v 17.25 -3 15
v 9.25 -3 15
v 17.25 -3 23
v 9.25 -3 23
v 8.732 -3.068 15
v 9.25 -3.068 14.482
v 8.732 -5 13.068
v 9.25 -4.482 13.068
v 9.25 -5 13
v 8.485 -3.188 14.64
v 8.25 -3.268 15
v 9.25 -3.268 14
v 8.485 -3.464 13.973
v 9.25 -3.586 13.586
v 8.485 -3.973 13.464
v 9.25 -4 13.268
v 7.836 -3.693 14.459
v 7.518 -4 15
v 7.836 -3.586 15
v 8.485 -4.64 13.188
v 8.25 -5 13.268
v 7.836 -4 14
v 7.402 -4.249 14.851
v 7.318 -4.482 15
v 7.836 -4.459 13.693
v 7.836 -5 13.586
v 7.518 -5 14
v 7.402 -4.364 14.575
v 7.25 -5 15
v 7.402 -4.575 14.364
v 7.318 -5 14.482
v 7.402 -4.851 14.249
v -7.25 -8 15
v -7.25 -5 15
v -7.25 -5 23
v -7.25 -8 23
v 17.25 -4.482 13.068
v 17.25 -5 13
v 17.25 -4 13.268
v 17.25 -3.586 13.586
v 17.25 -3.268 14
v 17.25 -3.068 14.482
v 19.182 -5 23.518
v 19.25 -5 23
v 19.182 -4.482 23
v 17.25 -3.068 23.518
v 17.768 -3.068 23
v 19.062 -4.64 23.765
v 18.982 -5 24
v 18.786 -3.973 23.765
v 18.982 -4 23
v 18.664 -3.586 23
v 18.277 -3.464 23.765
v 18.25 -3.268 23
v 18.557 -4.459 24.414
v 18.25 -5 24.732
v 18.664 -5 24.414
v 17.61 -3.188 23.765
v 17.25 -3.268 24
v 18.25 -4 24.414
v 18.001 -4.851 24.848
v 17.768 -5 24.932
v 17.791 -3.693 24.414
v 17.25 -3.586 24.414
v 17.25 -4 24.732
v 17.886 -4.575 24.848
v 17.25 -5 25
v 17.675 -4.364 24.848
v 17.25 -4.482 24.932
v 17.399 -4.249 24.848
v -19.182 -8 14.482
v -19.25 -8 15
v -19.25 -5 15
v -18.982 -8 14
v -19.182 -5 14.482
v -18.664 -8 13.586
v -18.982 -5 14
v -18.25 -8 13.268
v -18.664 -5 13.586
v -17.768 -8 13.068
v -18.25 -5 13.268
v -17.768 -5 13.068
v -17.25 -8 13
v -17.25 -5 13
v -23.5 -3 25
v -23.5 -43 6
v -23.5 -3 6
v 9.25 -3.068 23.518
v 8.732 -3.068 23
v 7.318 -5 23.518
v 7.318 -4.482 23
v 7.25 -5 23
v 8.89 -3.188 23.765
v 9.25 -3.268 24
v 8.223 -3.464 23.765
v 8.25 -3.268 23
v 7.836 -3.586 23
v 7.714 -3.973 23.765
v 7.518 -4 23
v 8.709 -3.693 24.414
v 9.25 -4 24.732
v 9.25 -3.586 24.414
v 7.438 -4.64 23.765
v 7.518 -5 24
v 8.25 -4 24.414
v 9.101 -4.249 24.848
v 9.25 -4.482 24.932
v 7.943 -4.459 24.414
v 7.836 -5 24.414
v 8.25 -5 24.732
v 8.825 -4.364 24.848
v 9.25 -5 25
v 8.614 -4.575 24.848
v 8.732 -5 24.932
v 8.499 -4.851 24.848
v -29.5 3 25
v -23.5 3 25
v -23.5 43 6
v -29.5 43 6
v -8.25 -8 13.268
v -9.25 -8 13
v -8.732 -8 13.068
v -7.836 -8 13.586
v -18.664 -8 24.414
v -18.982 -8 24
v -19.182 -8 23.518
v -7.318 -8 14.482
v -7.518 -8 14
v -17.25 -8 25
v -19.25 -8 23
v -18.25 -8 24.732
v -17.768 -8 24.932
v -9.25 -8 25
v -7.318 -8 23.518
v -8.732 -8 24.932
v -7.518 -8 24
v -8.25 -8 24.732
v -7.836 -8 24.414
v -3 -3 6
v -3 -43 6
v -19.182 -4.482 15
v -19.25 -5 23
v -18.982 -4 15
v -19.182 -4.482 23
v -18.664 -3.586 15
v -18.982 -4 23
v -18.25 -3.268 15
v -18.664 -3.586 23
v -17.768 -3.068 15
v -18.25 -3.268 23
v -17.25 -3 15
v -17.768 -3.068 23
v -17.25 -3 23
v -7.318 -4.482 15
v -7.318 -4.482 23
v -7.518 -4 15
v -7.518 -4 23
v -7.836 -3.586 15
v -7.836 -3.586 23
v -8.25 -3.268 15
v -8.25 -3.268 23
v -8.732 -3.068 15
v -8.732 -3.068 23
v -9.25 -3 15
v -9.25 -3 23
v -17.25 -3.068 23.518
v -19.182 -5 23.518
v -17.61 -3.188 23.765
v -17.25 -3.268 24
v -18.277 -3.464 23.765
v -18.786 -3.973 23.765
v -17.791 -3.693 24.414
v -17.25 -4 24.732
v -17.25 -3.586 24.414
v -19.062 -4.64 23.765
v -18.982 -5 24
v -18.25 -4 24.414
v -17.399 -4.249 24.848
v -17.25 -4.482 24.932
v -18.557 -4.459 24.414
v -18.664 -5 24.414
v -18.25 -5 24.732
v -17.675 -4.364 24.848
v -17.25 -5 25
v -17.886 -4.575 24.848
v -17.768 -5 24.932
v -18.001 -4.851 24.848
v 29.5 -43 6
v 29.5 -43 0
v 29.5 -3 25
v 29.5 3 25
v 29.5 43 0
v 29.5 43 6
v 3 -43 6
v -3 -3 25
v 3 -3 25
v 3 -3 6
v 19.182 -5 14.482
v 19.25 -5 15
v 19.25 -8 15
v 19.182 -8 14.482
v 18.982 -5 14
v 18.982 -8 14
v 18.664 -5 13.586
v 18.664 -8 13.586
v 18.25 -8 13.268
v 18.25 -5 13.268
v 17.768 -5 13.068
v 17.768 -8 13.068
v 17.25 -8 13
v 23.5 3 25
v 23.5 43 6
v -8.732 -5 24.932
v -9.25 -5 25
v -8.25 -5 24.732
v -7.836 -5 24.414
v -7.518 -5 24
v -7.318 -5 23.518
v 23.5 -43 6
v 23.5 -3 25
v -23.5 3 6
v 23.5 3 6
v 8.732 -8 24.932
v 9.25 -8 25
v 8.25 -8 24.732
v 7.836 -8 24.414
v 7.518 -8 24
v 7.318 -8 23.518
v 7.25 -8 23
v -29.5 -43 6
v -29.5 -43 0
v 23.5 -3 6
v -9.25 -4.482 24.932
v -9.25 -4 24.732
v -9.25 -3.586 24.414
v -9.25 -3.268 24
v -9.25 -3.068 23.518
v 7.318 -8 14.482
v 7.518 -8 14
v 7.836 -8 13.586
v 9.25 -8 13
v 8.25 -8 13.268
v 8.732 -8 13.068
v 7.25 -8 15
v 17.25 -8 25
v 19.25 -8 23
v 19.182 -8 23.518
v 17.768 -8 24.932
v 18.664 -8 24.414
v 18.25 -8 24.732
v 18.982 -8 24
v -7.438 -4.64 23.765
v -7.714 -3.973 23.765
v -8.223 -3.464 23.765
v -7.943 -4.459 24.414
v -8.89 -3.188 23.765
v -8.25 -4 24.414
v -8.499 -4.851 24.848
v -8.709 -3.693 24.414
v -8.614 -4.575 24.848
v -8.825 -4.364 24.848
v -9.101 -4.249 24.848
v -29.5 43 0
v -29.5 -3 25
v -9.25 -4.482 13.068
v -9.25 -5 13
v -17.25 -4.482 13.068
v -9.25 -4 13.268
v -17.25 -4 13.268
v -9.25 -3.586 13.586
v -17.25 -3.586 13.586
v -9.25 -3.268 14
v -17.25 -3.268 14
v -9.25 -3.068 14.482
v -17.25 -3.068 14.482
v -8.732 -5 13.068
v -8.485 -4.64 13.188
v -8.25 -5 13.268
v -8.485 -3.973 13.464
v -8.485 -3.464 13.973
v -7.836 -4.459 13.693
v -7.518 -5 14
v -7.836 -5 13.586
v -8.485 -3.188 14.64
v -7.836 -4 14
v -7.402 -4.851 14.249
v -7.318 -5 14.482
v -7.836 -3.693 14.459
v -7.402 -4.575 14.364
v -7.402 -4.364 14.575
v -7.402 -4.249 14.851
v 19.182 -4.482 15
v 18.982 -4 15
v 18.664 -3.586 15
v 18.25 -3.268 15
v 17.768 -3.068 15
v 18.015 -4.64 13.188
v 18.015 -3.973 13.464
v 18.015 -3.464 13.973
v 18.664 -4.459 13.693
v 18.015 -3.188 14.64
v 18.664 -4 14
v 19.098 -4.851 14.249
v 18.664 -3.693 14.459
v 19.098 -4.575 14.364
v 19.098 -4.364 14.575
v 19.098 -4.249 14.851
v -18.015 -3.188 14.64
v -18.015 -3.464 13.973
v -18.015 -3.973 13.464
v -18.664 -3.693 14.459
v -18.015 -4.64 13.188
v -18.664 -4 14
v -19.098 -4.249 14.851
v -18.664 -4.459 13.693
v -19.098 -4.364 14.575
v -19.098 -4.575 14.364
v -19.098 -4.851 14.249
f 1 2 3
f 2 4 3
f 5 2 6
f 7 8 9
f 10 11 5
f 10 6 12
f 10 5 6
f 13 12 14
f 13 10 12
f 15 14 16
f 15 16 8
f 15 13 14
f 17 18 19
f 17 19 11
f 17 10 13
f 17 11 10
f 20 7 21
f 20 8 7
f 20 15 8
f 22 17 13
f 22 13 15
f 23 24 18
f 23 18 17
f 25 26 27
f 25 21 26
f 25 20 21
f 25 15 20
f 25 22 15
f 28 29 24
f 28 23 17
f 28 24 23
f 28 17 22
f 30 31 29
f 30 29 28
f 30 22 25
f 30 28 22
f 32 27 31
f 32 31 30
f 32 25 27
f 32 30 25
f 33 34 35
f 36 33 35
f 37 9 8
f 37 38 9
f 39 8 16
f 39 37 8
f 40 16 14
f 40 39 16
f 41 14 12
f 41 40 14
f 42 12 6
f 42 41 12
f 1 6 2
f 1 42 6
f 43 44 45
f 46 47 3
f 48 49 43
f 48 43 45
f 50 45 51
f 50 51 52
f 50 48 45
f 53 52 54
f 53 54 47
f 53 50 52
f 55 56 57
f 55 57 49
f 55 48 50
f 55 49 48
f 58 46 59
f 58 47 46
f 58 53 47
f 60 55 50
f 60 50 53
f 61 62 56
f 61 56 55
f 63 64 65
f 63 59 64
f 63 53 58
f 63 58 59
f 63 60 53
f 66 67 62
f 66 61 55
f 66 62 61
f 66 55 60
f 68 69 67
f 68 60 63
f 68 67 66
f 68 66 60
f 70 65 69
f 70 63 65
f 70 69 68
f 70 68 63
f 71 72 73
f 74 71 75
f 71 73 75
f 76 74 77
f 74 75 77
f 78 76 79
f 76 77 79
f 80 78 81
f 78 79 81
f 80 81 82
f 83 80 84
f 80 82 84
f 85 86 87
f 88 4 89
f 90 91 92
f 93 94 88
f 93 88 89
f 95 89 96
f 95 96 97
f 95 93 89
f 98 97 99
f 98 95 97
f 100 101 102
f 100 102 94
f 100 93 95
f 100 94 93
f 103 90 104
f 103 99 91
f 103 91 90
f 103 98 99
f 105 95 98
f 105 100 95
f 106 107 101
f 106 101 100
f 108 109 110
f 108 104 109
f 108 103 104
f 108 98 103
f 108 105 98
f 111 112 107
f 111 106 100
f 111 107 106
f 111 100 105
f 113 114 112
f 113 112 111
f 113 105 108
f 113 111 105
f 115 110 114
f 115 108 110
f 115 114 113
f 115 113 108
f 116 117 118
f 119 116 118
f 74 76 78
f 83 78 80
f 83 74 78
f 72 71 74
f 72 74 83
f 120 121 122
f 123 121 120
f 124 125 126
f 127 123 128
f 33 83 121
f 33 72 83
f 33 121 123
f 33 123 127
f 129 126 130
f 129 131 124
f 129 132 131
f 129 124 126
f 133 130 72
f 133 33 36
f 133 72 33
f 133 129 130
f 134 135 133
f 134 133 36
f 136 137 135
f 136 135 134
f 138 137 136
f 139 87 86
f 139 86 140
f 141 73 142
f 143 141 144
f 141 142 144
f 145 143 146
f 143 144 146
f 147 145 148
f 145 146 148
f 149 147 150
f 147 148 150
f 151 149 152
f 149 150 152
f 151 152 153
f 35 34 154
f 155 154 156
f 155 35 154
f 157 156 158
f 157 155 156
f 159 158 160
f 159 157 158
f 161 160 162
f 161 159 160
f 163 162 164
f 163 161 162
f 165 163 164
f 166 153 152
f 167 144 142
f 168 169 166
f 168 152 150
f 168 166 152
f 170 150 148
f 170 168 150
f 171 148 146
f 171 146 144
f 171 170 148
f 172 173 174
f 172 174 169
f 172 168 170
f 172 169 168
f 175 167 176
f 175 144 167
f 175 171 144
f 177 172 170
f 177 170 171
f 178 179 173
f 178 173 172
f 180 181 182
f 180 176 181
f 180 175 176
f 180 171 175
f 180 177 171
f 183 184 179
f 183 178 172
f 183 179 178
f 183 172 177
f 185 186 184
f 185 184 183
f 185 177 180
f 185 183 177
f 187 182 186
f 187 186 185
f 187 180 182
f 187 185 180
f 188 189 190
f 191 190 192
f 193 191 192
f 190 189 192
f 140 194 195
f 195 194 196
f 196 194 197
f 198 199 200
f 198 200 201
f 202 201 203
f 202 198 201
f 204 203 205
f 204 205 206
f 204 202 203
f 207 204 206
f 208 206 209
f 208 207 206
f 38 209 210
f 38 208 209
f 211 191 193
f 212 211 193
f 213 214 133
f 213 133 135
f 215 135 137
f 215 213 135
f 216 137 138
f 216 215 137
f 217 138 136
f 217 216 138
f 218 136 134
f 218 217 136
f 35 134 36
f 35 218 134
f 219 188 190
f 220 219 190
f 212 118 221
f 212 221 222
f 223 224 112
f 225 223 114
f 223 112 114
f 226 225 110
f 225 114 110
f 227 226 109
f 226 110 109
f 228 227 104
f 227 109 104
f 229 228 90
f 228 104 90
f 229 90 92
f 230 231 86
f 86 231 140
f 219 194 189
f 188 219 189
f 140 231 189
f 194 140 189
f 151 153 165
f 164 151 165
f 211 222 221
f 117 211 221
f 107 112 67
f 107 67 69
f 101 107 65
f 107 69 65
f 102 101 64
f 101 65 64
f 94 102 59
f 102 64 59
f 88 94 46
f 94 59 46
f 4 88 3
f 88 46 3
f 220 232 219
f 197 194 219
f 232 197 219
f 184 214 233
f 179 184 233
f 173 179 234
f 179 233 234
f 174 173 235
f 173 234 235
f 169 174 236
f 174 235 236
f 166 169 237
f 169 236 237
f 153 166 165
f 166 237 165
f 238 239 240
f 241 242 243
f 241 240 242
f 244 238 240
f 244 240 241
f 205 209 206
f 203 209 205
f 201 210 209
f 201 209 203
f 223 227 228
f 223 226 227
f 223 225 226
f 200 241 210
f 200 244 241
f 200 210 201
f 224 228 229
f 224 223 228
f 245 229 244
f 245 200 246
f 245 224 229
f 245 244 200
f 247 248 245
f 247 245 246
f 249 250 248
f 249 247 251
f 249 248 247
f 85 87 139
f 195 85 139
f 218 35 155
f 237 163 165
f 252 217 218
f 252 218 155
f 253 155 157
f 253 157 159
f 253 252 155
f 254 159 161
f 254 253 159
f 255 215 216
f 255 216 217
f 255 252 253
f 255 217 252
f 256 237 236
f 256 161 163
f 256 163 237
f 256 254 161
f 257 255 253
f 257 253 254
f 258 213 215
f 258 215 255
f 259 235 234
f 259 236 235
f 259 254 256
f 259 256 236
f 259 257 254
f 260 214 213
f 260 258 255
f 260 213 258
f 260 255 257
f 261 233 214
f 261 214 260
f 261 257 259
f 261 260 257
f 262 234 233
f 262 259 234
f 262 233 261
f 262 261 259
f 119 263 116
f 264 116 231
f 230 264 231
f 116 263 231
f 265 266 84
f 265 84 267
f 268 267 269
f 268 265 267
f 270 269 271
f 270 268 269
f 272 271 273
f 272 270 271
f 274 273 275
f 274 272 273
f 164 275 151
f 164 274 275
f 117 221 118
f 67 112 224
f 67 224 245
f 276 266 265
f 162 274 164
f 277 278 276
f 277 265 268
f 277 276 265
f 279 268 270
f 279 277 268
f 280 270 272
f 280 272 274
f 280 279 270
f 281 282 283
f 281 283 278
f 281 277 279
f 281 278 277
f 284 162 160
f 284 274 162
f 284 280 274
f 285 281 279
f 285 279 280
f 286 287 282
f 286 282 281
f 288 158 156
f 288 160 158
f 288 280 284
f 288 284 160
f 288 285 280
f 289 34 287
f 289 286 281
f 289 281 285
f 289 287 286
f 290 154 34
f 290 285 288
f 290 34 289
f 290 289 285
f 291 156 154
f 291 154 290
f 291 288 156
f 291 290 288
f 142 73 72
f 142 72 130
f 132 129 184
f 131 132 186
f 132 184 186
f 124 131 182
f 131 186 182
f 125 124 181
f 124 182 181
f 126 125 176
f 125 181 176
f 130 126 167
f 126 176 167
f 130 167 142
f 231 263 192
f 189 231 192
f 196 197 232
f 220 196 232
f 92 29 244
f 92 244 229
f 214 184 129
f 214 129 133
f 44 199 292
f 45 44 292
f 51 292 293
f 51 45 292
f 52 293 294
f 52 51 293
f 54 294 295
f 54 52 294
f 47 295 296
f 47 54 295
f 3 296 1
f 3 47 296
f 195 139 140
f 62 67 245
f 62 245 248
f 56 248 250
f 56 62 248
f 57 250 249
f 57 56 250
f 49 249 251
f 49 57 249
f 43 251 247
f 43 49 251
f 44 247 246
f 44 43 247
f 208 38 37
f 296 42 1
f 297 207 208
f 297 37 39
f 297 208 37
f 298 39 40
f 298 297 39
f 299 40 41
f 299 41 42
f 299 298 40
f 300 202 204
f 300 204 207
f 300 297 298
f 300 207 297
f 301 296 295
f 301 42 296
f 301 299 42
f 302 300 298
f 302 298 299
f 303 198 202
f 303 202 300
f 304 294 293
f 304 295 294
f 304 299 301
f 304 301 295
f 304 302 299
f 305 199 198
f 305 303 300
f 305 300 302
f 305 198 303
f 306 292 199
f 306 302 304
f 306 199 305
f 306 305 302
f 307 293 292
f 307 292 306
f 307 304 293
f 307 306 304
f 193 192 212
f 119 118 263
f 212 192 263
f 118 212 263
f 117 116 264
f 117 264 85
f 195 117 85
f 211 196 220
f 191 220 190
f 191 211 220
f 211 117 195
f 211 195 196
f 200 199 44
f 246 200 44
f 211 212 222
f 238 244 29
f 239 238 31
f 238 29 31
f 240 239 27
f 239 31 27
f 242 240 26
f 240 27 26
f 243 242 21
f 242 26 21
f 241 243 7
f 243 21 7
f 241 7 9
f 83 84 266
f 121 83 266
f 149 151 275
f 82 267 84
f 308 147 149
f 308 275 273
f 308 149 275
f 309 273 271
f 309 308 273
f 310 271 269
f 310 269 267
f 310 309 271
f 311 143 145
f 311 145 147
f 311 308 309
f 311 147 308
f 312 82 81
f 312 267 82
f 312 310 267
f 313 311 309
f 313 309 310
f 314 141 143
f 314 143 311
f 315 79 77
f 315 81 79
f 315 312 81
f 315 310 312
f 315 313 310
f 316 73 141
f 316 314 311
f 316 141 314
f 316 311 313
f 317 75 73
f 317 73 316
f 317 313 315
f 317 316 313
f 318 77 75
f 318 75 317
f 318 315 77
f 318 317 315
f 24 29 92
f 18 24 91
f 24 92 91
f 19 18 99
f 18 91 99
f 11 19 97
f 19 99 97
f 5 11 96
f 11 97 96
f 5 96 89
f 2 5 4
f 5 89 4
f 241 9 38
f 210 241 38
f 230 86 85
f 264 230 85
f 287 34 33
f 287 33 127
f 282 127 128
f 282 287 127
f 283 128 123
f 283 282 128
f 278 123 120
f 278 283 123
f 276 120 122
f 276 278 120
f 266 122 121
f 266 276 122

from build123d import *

# Parameters (mm, degrees)
F0_W            = 59
F0_H            = 86
F1_DEPTH        = 6
F3_DEPTH        = 19
F5_DEPTH        = 59.001
F6_W            = 12
F6_H            = 12
F7_DEPTH        = 5
F8_R            = 2
F9_T1_DEPTH     = 8
F9_S5_W         = 2
F9_S5_H         = 2
F9_T6_DEPTH     = 2
F9_S11_W        = 2
F9_S11_H        = 2
F9_T12_DEPTH    = 2
F9_S17_W        = 2
F9_S17_H        = 2
F9_T18_DEPTH    = 2
F9_S23_W        = 2
F9_S23_H        = 2
F9_T24_DEPTH    = 2
F9_S1_T1_DEPTH  = 8
F9_S1_S5_W      = 2
F9_S1_S5_H      = 2
F9_S1_T6_DEPTH  = 2
F9_S1_S11_W     = 2
F9_S1_S11_H     = 2
F9_S1_T12_DEPTH = 2
F9_S1_S17_W     = 2
F9_S1_S17_H     = 2
F9_S1_T18_DEPTH = 2
F9_S1_S23_W     = 2
F9_S1_S23_H     = 2
F9_S1_T24_DEPTH = 2


# Not quite as in the source:
# - a fillet or chamfer that OpenCascade refuses, or shapes differently, is made with other operations: its cross-section is extruded or revolved along the edge and cut away or added


with BuildPart() as f1:
    # F0 (on Top) → F1 (new body)
    with BuildSketch(Plane.XY):
        Rectangle(F0_W, F0_H)
    extrude(amount=F1_DEPTH)

    # F2 (on face) → F3 (join)
    with BuildSketch(Plane.XY.offset(6)):
        Polygon((-23.5, 43), (-29.5, 43), (-29.5, -43), (-23.5, -43), (-23.5, -3), (-3, -3), (-3, -43), (3, -43), (3, -3), (23.5, -3), (23.5, -43), (29.5, -43), (29.5, 43), (23.5, 43), (23.5, 3), (-23.5, 3), align=None)
    extrude(amount=F3_DEPTH)

    # F4 (on face) → F5 (cut, through all)
    with BuildSketch(Plane.YZ.offset(29.5)):
        Polygon((-43, 25), (-43, 6), (-3, 25), align=None)
        Polygon((43, 25), (3, 25), (43, 6), align=None)
    extrude(amount=-F5_DEPTH, mode=Mode.SUBTRACT)


with BuildPart() as f7:
    # F6 (on face) → F7 (new body)
    with BuildSketch(Plane.XZ.offset(3)):
        with Locations((-13.25, 19)):
            Rectangle(F6_W, F6_H)
        with Locations((13.25, 19)):
            Rectangle(F6_W, F6_H)
    extrude(amount=F7_DEPTH)

    # F8
    f8_edges = [f7.edges().sort_by_distance(p)[0] for p in [
        (-7.25, -3, 19),
        (-13.25, -3, 25),
        (-19.25, -3, 19),
        (-13.25, -3, 13),
        (13.25, -3, 13),
        (7.25, -3, 19),
        (19.25, -3, 19),
        (13.25, -3, 25),
    ]]
    fillet(f8_edges, radius=F8_R)

    # F9: fillet of radius 2 on 4 edges, made by hand

    # F9_s2 → F9_t1 (cut)
    with BuildSketch(Plane.XZ.offset(5)):
        with BuildLine():
            ThreePointArc((-7.25, 15), (-7.8357864376, 13.5857864376), (-9.25, 13))
            Line((-9.25, 13), (-7.25, 13))
            Line((-7.25, 13), (-7.25, 15))
        make_face()
        with BuildLine():
            ThreePointArc((-19.25, 15), (-18.6642135624, 13.5857864376), (-17.25, 13))
            Line((-17.25, 13), (-19.25, 13))
            Line((-19.25, 13), (-19.25, 15))
        make_face()
        with BuildLine():
            ThreePointArc((-9.25, 25), (-7.8357864376, 24.4142135624), (-7.25, 23))
            Line((-7.25, 23), (-7.25, 25))
            Line((-7.25, 25), (-9.25, 25))
        make_face()
        with BuildLine():
            ThreePointArc((-17.25, 25), (-18.6642135624, 24.4142135624), (-19.25, 23))
            Line((-19.25, 23), (-19.25, 25))
            Line((-19.25, 25), (-17.25, 25))
        make_face()
    extrude(amount=F9_T1_DEPTH, mode=Mode.SUBTRACT)


with BuildPart() as f9_tool4:
    # F9_s5 → F9_t6 (new body)
    with BuildSketch(Plane.XY.offset(23)):
        with Locations((-18.25, -4)):
            Rectangle(F9_S5_W, F9_S5_H)
    extrude(amount=F9_T6_DEPTH)

    # F9_s7 → F9_t8 (revolve, cut)
    with BuildSketch(Plane(origin=(-17.25, -5, 23), x_dir=(0.7071067812, -0.7071067812, 0), z_dir=(-0.7071067812, -0.7071067812, 0))):
        with BuildLine():
            ThreePointArc((0, -2), (2, 0), (0, 2))
            Line((0, 2), (0, -2))
        make_face()
    revolve(axis=Axis((-17.25, -5, 23), (0, 0, 1)), mode=Mode.SUBTRACT)


with BuildPart() as f7_1:
    add(f7.part)

    # F9_t3: cut F9_tool4
    add(f9_tool4.part, mode=Mode.SUBTRACT)


with BuildPart() as f9_tool10:
    # F9_s11 → F9_t12 (new body)
    with BuildSketch(Plane.XY.offset(23)):
        with Locations((-8.25, -4)):
            Rectangle(F9_S11_W, F9_S11_H)
    extrude(amount=F9_T12_DEPTH)

    # F9_s13 → F9_t14 (revolve, cut)
    with BuildSketch(Plane(origin=(-9.25, -5, 23), x_dir=(-0.7071067812, -0.7071067812, 0), z_dir=(-0.7071067812, 0.7071067812, 0))):
        with BuildLine():
            ThreePointArc((0, -2), (2, 0), (0, 2))
            Line((0, 2), (0, -2))
        make_face()
    revolve(axis=Axis((-9.25, -5, 23), (0, 0, 1)), mode=Mode.SUBTRACT)


with BuildPart() as f7_2:
    add(f7_1.part)

    # F9_t9: cut F9_tool10
    add(f9_tool10.part, mode=Mode.SUBTRACT)


with BuildPart() as f9_tool16:
    # F9_s17 → F9_t18 (new body)
    with BuildSketch(Plane.YZ.offset(-17.25)):
        with Locations((-4, 14)):
            Rectangle(F9_S17_W, F9_S17_H)
    extrude(amount=-F9_T18_DEPTH)

    # F9_s19 → F9_t20 (revolve, cut)
    with BuildSketch(Plane(origin=(-17.25, -5, 15), x_dir=(0, -0.7071067812, 0.7071067812), z_dir=(0, -0.7071067812, -0.7071067812))):
        with BuildLine():
            ThreePointArc((0, -2), (2, 0), (0, 2))
            Line((0, 2), (0, -2))
        make_face()
    revolve(axis=Axis((-17.25, -5, 15), (-1, 0, 0)), mode=Mode.SUBTRACT)


with BuildPart() as f7_3:
    add(f7_2.part)

    # F9_t15: cut F9_tool16
    add(f9_tool16.part, mode=Mode.SUBTRACT)


with BuildPart() as f9_tool22:
    # F9_s23 → F9_t24 (new body)
    with BuildSketch(Plane.YZ.offset(-9.25)):
        with Locations((-4, 14)):
            Rectangle(F9_S23_W, F9_S23_H)
    extrude(amount=F9_T24_DEPTH)

    # F9_s25 → F9_t26 (revolve, cut)
    with BuildSketch(Plane(origin=(-9.25, -5, 15), x_dir=(0, -0.7071067812, 0.7071067812), z_dir=(0, 0.7071067812, 0.7071067812))):
        with BuildLine():
            ThreePointArc((0, -2), (2, 0), (0, 2))
            Line((0, 2), (0, -2))
        make_face()
    revolve(axis=Axis((-9.25, -5, 15), (1, 0, 0)), mode=Mode.SUBTRACT)


with BuildPart() as f7_4:
    add(f7_3.part)

    # F9_t21: cut F9_tool22
    add(f9_tool22.part, mode=Mode.SUBTRACT)

    # F9#s1: fillet of radius 2 on 4 edges, made by hand

    # F9_s1_s2 → F9_s1_t1 (cut)
    with BuildSketch(Plane.XZ.offset(5)):
        with BuildLine():
            ThreePointArc((19.25, 15), (18.6642135624, 13.5857864376), (17.25, 13))
            Line((17.25, 13), (19.25, 13))
            Line((19.25, 13), (19.25, 15))
        make_face()
        with BuildLine():
            ThreePointArc((17.25, 25), (18.6642135624, 24.4142135624), (19.25, 23))
            Line((19.25, 23), (19.25, 25))
            Line((19.25, 25), (17.25, 25))
        make_face()
        with BuildLine():
            ThreePointArc((7.25, 15), (7.8357864376, 13.5857864376), (9.25, 13))
            Line((9.25, 13), (7.25, 13))
            Line((7.25, 13), (7.25, 15))
        make_face()
        with BuildLine():
            ThreePointArc((9.25, 25), (7.8357864376, 24.4142135624), (7.25, 23))
            Line((7.25, 23), (7.25, 25))
            Line((7.25, 25), (9.25, 25))
        make_face()
    extrude(amount=F9_S1_T1_DEPTH, mode=Mode.SUBTRACT)


with BuildPart() as f9_s1_tool4:
    # F9_s1_s5 → F9_s1_t6 (new body)
    with BuildSketch(Plane.XY.offset(23)):
        with Locations((8.25, -4)):
            Rectangle(F9_S1_S5_W, F9_S1_S5_H)
    extrude(amount=F9_S1_T6_DEPTH)

    # F9_s1_s7 → F9_s1_t8 (revolve, cut)
    with BuildSketch(Plane(origin=(9.25, -5, 23), x_dir=(0.7071067812, -0.7071067812, 0), z_dir=(-0.7071067812, -0.7071067812, 0))):
        with BuildLine():
            ThreePointArc((0, -2), (2, 0), (0, 2))
            Line((0, 2), (0, -2))
        make_face()
    revolve(axis=Axis((9.25, -5, 23), (0, 0, 1)), mode=Mode.SUBTRACT)


with BuildPart() as f7_5:
    add(f7_4.part)

    # F9_s1_t3: cut F9_s1_tool4
    add(f9_s1_tool4.part, mode=Mode.SUBTRACT)


with BuildPart() as f9_s1_tool10:
    # F9_s1_s11 → F9_s1_t12 (new body)
    with BuildSketch(Plane.YZ.offset(9.25)):
        with Locations((-4, 14)):
            Rectangle(F9_S1_S11_W, F9_S1_S11_H)
    extrude(amount=-F9_S1_T12_DEPTH)

    # F9_s1_s13 → F9_s1_t14 (revolve, cut)
    with BuildSketch(Plane(origin=(9.25, -5, 15), x_dir=(0, -0.7071067812, 0.7071067812), z_dir=(0, -0.7071067812, -0.7071067812))):
        with BuildLine():
            ThreePointArc((0, -2), (2, 0), (0, 2))
            Line((0, 2), (0, -2))
        make_face()
    revolve(axis=Axis((9.25, -5, 15), (-1, 0, 0)), mode=Mode.SUBTRACT)


with BuildPart() as f7_6:
    add(f7_5.part)

    # F9_s1_t9: cut F9_s1_tool10
    add(f9_s1_tool10.part, mode=Mode.SUBTRACT)


with BuildPart() as f9_s1_tool16:
    # F9_s1_s17 → F9_s1_t18 (new body)
    with BuildSketch(Plane.XY.offset(23)):
        with Locations((18.25, -4)):
            Rectangle(F9_S1_S17_W, F9_S1_S17_H)
    extrude(amount=F9_S1_T18_DEPTH)

    # F9_s1_s19 → F9_s1_t20 (revolve, cut)
    with BuildSketch(Plane(origin=(17.25, -5, 23), x_dir=(-0.7071067812, -0.7071067812, 0), z_dir=(-0.7071067812, 0.7071067812, 0))):
        with BuildLine():
            ThreePointArc((0, -2), (2, 0), (0, 2))
            Line((0, 2), (0, -2))
        make_face()
    revolve(axis=Axis((17.25, -5, 23), (0, 0, 1)), mode=Mode.SUBTRACT)


with BuildPart() as f7_7:
    add(f7_6.part)

    # F9_s1_t15: cut F9_s1_tool16
    add(f9_s1_tool16.part, mode=Mode.SUBTRACT)


with BuildPart() as f9_s1_tool22:
    # F9_s1_s23 → F9_s1_t24 (new body)
    with BuildSketch(Plane.YZ.offset(17.25)):
        with Locations((-4, 14)):
            Rectangle(F9_S1_S23_W, F9_S1_S23_H)
    extrude(amount=F9_S1_T24_DEPTH)

    # F9_s1_s25 → F9_s1_t26 (revolve, cut)
    with BuildSketch(Plane(origin=(17.25, -5, 15), x_dir=(0, -0.7071067812, 0.7071067812), z_dir=(0, 0.7071067812, 0.7071067812))):
        with BuildLine():
            ThreePointArc((0, -2), (2, 0), (0, 2))
            Line((0, 2), (0, -2))
        make_face()
    revolve(axis=Axis((17.25, -5, 15), (1, 0, 0)), mode=Mode.SUBTRACT)


with BuildPart() as f7_8:
    add(f7_7.part)

    # F9_s1_t21: cut F9_s1_tool22
    add(f9_s1_tool22.part, mode=Mode.SUBTRACT)


solid = Compound([f1.part, f7_8.part])
